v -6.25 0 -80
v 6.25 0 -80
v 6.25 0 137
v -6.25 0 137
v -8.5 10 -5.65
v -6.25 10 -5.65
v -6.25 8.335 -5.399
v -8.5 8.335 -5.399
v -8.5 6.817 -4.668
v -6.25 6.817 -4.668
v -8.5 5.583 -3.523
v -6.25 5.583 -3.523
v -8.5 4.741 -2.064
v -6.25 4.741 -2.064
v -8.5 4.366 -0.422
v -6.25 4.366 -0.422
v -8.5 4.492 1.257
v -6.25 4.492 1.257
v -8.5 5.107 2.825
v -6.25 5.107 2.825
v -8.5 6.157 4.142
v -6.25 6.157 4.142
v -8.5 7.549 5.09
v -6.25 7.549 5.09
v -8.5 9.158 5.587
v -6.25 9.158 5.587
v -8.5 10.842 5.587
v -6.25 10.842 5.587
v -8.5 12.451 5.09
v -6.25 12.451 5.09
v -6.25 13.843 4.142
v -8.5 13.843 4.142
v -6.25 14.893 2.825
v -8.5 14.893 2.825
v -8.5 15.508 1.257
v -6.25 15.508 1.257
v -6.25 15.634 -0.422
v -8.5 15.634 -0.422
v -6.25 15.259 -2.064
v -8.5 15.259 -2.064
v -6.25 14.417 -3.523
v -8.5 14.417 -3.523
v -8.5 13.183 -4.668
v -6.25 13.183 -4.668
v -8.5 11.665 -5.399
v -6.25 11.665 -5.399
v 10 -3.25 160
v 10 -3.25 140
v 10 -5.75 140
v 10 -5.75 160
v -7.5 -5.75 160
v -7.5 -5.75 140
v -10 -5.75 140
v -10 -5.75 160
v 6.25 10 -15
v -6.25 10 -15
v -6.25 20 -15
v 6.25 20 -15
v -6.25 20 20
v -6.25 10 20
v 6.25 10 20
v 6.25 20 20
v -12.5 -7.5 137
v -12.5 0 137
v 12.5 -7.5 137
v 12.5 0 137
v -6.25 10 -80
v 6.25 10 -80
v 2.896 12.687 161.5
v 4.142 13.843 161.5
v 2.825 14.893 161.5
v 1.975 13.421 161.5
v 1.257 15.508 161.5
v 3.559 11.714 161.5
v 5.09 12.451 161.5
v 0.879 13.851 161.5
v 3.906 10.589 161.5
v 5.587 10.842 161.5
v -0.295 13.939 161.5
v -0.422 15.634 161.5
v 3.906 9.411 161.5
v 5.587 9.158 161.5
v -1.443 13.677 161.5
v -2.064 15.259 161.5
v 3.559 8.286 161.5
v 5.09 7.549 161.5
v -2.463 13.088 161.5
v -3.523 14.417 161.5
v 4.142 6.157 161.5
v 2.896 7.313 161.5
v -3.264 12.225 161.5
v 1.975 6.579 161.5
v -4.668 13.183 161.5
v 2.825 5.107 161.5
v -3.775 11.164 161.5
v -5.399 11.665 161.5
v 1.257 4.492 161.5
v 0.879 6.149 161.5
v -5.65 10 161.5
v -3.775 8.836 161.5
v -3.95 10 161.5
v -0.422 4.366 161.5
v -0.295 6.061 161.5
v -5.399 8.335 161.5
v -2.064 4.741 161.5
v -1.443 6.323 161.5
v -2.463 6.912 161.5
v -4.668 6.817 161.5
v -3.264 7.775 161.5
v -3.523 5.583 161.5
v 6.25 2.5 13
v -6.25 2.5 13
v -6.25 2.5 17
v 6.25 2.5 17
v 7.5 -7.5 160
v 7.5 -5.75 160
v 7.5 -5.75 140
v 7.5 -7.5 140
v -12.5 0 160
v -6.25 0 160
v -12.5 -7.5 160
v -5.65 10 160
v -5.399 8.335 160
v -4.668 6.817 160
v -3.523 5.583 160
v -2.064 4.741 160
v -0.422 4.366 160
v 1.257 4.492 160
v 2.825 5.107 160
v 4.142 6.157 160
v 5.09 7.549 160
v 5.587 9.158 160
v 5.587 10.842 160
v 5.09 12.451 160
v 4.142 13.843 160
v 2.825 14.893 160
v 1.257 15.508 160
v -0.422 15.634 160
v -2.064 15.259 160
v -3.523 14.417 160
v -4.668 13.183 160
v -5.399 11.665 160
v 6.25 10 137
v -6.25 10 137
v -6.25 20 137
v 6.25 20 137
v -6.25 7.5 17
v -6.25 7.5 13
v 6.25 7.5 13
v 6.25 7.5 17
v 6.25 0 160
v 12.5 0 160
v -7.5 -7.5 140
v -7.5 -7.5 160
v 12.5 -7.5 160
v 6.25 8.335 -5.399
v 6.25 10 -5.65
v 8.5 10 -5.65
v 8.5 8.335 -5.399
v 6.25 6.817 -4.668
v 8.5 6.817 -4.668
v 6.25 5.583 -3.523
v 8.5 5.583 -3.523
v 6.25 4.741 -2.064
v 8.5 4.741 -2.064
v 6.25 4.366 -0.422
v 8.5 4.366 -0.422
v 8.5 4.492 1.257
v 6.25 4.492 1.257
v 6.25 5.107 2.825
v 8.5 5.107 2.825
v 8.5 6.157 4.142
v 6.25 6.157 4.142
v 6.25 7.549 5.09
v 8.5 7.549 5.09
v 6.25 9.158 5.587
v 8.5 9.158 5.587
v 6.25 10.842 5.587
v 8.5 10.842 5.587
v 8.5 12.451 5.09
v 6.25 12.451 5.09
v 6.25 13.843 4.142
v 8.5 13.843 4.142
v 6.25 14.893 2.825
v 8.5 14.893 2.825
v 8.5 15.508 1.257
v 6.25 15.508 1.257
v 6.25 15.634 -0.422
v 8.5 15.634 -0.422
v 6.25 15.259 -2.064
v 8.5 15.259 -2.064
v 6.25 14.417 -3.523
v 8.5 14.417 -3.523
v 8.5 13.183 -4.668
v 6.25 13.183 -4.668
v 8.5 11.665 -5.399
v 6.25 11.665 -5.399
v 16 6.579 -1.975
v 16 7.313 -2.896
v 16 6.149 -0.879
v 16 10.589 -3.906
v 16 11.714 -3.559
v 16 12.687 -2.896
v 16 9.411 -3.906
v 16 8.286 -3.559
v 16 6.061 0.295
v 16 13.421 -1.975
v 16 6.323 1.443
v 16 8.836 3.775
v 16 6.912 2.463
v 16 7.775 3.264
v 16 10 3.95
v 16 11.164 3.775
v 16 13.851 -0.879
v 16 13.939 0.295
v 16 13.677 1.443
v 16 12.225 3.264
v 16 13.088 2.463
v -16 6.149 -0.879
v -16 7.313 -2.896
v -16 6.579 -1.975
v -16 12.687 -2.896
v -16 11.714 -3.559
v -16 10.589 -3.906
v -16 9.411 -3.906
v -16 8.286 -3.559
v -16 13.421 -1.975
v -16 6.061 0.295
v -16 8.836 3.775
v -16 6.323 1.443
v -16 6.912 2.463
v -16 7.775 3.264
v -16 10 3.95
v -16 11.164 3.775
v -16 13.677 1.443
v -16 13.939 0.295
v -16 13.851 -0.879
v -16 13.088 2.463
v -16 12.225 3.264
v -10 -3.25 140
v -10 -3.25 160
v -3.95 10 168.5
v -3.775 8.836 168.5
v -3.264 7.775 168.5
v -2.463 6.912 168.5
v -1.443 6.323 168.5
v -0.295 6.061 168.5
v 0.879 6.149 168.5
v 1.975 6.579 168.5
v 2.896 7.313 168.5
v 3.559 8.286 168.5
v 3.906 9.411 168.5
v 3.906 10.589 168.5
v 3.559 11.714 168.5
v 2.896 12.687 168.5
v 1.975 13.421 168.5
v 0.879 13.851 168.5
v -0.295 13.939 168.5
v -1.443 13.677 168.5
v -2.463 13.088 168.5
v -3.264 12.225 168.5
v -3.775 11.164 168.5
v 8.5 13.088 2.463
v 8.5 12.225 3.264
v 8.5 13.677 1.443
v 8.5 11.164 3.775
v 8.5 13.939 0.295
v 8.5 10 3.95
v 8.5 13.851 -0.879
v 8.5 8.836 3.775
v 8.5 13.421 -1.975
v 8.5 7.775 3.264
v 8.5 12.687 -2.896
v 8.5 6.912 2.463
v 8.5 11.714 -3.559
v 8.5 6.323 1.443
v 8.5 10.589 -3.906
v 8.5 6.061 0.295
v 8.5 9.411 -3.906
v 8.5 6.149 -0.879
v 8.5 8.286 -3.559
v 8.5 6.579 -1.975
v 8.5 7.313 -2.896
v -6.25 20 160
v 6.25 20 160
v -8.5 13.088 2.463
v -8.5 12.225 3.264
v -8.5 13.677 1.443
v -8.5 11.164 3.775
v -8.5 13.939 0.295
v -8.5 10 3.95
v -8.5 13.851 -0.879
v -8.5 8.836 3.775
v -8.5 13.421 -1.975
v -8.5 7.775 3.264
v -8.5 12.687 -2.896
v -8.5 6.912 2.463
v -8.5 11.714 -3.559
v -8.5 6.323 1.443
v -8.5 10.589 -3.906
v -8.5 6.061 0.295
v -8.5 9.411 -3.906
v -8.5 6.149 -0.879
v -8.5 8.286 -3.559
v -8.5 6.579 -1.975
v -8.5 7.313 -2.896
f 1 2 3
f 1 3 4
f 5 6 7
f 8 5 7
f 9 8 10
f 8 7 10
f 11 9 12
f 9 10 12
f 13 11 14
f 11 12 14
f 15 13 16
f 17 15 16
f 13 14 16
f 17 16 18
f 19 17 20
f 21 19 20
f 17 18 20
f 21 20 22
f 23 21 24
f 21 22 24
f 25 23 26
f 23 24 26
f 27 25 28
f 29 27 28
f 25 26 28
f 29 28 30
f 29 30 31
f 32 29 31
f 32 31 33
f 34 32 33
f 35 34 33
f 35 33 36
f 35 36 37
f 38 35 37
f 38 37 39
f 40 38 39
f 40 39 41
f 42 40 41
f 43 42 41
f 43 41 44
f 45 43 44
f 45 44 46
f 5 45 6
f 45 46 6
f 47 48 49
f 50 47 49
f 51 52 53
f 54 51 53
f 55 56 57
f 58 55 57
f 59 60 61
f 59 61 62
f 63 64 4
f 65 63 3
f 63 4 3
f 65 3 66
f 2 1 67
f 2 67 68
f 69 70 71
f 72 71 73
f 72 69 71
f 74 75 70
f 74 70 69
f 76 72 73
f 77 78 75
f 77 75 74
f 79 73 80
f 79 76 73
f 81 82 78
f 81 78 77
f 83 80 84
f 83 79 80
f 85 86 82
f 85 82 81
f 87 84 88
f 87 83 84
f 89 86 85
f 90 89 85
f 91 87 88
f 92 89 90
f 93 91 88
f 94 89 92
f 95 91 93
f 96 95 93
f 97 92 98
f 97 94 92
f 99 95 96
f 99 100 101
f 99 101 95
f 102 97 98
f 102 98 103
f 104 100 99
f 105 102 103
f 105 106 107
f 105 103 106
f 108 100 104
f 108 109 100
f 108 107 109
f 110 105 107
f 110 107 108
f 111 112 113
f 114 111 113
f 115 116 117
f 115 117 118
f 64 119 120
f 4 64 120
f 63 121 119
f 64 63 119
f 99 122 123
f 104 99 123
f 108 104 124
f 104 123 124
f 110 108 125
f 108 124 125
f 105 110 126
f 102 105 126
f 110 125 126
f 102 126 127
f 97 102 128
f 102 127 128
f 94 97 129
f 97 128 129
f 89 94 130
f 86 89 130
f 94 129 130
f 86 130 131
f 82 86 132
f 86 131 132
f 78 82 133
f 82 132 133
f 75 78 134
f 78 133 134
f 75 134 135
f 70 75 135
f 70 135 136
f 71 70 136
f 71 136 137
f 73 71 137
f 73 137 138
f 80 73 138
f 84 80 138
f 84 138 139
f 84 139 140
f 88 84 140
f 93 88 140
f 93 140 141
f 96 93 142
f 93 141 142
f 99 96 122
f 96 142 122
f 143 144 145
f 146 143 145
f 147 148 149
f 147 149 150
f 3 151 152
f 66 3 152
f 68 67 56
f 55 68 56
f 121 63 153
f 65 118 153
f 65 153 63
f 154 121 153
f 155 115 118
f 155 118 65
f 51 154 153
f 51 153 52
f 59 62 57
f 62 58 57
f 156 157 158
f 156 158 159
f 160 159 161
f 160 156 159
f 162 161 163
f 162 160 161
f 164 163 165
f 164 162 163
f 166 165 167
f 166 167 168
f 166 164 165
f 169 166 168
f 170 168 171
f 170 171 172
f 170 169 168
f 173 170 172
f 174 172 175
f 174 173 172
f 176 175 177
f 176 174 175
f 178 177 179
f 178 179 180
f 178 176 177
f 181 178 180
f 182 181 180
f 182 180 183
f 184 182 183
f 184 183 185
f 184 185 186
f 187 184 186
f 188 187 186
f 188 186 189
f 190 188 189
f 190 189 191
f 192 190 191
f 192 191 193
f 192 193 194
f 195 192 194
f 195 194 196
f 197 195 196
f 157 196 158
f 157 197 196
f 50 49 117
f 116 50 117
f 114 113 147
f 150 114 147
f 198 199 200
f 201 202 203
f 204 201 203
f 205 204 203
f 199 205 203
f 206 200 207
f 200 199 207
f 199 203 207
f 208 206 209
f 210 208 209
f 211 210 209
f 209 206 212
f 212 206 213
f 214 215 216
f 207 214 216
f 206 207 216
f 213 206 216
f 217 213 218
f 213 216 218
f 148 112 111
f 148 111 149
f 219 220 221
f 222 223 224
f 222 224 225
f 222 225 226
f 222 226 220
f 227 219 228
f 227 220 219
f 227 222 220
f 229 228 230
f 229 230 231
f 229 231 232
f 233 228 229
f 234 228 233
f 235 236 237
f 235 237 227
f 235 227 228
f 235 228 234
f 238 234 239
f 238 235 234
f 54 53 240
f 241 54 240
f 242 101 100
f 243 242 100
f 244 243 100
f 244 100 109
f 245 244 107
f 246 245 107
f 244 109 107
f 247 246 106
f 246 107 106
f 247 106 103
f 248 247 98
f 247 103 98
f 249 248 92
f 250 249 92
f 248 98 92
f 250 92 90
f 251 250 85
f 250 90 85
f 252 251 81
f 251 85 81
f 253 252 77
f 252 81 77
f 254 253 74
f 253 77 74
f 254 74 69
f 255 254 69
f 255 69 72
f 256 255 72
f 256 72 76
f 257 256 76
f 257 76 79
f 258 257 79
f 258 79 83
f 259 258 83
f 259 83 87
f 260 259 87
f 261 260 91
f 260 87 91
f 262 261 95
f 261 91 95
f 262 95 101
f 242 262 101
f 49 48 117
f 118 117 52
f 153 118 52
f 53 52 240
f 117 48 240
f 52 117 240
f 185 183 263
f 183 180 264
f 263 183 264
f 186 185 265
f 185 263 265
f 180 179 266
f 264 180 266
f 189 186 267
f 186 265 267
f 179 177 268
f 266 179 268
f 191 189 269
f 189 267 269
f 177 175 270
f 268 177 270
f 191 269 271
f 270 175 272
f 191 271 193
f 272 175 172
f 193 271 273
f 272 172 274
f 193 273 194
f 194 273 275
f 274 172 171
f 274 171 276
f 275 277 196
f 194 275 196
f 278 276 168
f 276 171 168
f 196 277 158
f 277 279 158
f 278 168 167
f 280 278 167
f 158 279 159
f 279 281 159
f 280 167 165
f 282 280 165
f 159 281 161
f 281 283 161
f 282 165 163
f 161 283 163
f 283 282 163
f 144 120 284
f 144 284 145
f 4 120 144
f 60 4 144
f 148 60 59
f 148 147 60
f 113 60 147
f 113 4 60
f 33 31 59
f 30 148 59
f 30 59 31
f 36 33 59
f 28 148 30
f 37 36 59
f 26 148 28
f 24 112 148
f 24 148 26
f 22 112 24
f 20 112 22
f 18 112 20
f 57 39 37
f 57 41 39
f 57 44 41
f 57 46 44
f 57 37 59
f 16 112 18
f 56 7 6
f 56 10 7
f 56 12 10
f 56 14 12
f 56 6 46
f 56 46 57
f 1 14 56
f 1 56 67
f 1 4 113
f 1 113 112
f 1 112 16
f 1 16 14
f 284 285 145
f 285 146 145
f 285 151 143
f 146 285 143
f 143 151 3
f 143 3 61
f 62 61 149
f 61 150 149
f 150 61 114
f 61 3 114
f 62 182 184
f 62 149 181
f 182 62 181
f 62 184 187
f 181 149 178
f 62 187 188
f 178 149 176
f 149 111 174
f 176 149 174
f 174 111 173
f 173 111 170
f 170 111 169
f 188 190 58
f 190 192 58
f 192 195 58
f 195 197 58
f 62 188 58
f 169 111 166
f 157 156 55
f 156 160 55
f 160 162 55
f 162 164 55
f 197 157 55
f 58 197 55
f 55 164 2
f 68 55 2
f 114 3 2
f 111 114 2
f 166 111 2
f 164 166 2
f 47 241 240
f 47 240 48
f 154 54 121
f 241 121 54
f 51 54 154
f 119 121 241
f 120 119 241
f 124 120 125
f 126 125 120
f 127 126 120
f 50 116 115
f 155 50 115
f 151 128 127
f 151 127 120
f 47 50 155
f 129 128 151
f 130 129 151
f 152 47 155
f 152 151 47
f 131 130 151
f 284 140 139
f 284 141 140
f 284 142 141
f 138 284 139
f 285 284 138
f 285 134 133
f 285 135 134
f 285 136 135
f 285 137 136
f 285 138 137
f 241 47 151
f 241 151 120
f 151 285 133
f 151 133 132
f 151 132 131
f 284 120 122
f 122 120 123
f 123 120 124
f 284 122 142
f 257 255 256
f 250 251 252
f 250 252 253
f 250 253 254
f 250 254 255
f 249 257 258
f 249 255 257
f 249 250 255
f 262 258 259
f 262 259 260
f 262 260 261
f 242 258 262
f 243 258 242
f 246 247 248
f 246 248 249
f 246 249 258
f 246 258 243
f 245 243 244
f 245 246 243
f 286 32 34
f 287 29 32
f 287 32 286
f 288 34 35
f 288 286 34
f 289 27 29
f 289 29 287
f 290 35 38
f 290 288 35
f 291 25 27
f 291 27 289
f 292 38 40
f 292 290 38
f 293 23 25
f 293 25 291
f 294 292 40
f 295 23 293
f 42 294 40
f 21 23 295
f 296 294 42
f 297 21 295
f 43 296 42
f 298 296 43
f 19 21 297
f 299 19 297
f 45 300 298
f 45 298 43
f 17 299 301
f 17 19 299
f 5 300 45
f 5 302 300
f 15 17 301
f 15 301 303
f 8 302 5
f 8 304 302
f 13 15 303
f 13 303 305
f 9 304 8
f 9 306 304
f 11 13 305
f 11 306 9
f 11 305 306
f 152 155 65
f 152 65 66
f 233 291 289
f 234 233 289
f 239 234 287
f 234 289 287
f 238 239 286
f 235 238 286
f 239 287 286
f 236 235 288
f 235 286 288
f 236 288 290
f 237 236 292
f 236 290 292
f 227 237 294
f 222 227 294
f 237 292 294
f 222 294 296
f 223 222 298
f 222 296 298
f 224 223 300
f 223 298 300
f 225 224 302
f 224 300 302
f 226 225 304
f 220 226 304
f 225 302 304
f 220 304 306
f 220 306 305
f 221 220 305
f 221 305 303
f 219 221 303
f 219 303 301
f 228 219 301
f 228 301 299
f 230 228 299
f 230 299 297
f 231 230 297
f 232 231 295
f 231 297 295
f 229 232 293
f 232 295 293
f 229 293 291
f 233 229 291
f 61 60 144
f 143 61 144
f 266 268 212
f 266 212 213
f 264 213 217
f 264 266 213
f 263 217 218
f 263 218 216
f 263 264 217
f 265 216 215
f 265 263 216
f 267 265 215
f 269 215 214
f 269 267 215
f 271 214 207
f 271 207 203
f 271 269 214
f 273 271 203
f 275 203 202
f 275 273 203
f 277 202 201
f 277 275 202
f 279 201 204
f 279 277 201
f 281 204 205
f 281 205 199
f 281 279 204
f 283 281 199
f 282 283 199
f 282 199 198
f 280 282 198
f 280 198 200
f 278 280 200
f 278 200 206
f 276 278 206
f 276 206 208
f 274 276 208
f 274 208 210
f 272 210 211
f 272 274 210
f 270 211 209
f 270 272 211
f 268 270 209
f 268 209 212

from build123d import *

# Parameters (mm, degrees)
BOSS_EXTRUDE1_DEPTH = 20
SKETCH2_R           = 5.65
BOSS_EXTRUDE2_DEPTH = 1.5
SKETCH3_R           = 3.95
BOSS_EXTRUDE3_DEPTH = 7
SKETCH4_R           = 5.65
BOSS_EXTRUDE4_DEPTH = 2.25
SKETCH5_R           = 3.95
BOSS_EXTRUDE5_DEPTH = 7.5
SKETCH9_W           = 25
SKETCH9_H           = 7.5
BOSS_EXTRUDE8_DEPTH = 23
CUT_EXTRUDE1_DEPTH  = 20
CUT_EXTRUDE2_REACH  = 173.135
SKETCH12_W          = 4
SKETCH12_H          = 5
CUT_EXTRUDE3_REACH  = 173.135
SKETCH14_W          = 65
SKETCH14_H          = 10
SKETCH14_W_2        = 117


with BuildPart() as part:
    # Sketch1 → Boss-Extrude1 (new body)
    with BuildSketch(Plane(origin=(0, 0, 0), x_dir=(1, 0, 0), z_dir=(0, 1, 0))):
        Polygon((-6.25, 80), (6.25, 80), (6.25, 0), (6.25, -160), (-6.25, -160), align=None)
    extrude(amount=BOSS_EXTRUDE1_DEPTH)

    # Sketch2 → Boss-Extrude2 (add)
    with BuildSketch(Plane.XY.offset(160)):
        with Locations(Location((0, 10, 0), (0, 0, 180))):
            Circle(SKETCH2_R)
    extrude(amount=BOSS_EXTRUDE2_DEPTH)

    # Sketch3 → Boss-Extrude3 (add)
    with BuildSketch(Plane.XY.offset(161.5)):
        with Locations(Location((0, 10, 0), (0, 0, 180))):
            Circle(SKETCH3_R)
    extrude(amount=BOSS_EXTRUDE3_DEPTH)

    # Sketch4 → Boss-Extrude4 (add)
    with BuildSketch(Plane.ZY.offset(6.25)):
        with Locations(Location((0, 10, 0), (0, 0, 180))):
            Circle(SKETCH4_R)
    boss_extrude4 = extrude(amount=BOSS_EXTRUDE4_DEPTH)

    # Sketch5 → Boss-Extrude5 (add)
    with BuildSketch(Plane.ZY.offset(8.5)):
        with Locations((0, 10)):
            Circle(SKETCH5_R)
    boss_extrude5 = extrude(amount=BOSS_EXTRUDE5_DEPTH)

    # Mirror1: Boss-Extrude4, Boss-Extrude5 across plane
    add(boss_extrude4.mirror(Plane(origin=(0, 0, 0), x_dir=(0, 0, 1), z_dir=(1, 0, 0))))
    add(boss_extrude5.mirror(Plane(origin=(0, 0, 0), x_dir=(0, 0, 1), z_dir=(1, 0, 0))))

    # Sketch9 → Boss-Extrude8 (add)
    with BuildSketch(Plane.XY.offset(160)):
        with Locations((0, -3.75)):
            Rectangle(SKETCH9_W, SKETCH9_H)
    extrude(amount=-BOSS_EXTRUDE8_DEPTH)

    # Sketch10 → Cut-Extrude1 (cut)
    with BuildSketch(Plane.XY.offset(160)):
        Polygon((-10, -5.75), (-10, -3.25), (10, -3.25), (10, -5.75), (7.5, -5.75), (7.5, -7.5), (-7.5, -7.5), (-7.5, -5.75), align=None)
    extrude(amount=-CUT_EXTRUDE1_DEPTH, mode=Mode.SUBTRACT)

    # Sketch12 → Cut-Extrude2 (cut, up to next)
    with BuildSketch(Plane.ZY.offset(6.25), mode=Mode.PRIVATE) as cut_extrude2_sk1:
        with Locations((15, 5)):
            Rectangle(SKETCH12_W, SKETCH12_H)
    cut_extrude2_tool1 = extrude(cut_extrude2_sk1.sketch, amount=-CUT_EXTRUDE2_REACH, mode=Mode.PRIVATE) & part.part
    add(cut_extrude2_tool1.solids().sort_by_distance((-6.25, 5, 15))[0], mode=Mode.SUBTRACT)

    # Sketch14 → Cut-Extrude3 (cut, up to next)
    with BuildSketch(Plane.ZY.offset(6.25), mode=Mode.PRIVATE) as cut_extrude3_sk1:
        with Locations((-47.5, 15)):
            Rectangle(SKETCH14_W, SKETCH14_H)
    cut_extrude3_tool1 = extrude(cut_extrude3_sk1.sketch, amount=-CUT_EXTRUDE3_REACH, mode=Mode.PRIVATE) & part.part
    # Sketch14 → Cut-Extrude3 (cut, up to next)
    with BuildSketch(Plane.ZY.offset(6.25), mode=Mode.PRIVATE) as cut_extrude3_sk2:
        with Locations((78.5, 15)):
            Rectangle(SKETCH14_W_2, SKETCH14_H)
    cut_extrude3_tool2 = extrude(cut_extrude3_sk2.sketch, amount=-CUT_EXTRUDE3_REACH, mode=Mode.PRIVATE) & part.part
    add(cut_extrude3_tool1.solids().sort_by_distance((-6.25, 15, -47.5))[0], mode=Mode.SUBTRACT)
    add(cut_extrude3_tool2.solids().sort_by_distance((-6.25, 15, 78.5))[0], mode=Mode.SUBTRACT)


solid = part.part
